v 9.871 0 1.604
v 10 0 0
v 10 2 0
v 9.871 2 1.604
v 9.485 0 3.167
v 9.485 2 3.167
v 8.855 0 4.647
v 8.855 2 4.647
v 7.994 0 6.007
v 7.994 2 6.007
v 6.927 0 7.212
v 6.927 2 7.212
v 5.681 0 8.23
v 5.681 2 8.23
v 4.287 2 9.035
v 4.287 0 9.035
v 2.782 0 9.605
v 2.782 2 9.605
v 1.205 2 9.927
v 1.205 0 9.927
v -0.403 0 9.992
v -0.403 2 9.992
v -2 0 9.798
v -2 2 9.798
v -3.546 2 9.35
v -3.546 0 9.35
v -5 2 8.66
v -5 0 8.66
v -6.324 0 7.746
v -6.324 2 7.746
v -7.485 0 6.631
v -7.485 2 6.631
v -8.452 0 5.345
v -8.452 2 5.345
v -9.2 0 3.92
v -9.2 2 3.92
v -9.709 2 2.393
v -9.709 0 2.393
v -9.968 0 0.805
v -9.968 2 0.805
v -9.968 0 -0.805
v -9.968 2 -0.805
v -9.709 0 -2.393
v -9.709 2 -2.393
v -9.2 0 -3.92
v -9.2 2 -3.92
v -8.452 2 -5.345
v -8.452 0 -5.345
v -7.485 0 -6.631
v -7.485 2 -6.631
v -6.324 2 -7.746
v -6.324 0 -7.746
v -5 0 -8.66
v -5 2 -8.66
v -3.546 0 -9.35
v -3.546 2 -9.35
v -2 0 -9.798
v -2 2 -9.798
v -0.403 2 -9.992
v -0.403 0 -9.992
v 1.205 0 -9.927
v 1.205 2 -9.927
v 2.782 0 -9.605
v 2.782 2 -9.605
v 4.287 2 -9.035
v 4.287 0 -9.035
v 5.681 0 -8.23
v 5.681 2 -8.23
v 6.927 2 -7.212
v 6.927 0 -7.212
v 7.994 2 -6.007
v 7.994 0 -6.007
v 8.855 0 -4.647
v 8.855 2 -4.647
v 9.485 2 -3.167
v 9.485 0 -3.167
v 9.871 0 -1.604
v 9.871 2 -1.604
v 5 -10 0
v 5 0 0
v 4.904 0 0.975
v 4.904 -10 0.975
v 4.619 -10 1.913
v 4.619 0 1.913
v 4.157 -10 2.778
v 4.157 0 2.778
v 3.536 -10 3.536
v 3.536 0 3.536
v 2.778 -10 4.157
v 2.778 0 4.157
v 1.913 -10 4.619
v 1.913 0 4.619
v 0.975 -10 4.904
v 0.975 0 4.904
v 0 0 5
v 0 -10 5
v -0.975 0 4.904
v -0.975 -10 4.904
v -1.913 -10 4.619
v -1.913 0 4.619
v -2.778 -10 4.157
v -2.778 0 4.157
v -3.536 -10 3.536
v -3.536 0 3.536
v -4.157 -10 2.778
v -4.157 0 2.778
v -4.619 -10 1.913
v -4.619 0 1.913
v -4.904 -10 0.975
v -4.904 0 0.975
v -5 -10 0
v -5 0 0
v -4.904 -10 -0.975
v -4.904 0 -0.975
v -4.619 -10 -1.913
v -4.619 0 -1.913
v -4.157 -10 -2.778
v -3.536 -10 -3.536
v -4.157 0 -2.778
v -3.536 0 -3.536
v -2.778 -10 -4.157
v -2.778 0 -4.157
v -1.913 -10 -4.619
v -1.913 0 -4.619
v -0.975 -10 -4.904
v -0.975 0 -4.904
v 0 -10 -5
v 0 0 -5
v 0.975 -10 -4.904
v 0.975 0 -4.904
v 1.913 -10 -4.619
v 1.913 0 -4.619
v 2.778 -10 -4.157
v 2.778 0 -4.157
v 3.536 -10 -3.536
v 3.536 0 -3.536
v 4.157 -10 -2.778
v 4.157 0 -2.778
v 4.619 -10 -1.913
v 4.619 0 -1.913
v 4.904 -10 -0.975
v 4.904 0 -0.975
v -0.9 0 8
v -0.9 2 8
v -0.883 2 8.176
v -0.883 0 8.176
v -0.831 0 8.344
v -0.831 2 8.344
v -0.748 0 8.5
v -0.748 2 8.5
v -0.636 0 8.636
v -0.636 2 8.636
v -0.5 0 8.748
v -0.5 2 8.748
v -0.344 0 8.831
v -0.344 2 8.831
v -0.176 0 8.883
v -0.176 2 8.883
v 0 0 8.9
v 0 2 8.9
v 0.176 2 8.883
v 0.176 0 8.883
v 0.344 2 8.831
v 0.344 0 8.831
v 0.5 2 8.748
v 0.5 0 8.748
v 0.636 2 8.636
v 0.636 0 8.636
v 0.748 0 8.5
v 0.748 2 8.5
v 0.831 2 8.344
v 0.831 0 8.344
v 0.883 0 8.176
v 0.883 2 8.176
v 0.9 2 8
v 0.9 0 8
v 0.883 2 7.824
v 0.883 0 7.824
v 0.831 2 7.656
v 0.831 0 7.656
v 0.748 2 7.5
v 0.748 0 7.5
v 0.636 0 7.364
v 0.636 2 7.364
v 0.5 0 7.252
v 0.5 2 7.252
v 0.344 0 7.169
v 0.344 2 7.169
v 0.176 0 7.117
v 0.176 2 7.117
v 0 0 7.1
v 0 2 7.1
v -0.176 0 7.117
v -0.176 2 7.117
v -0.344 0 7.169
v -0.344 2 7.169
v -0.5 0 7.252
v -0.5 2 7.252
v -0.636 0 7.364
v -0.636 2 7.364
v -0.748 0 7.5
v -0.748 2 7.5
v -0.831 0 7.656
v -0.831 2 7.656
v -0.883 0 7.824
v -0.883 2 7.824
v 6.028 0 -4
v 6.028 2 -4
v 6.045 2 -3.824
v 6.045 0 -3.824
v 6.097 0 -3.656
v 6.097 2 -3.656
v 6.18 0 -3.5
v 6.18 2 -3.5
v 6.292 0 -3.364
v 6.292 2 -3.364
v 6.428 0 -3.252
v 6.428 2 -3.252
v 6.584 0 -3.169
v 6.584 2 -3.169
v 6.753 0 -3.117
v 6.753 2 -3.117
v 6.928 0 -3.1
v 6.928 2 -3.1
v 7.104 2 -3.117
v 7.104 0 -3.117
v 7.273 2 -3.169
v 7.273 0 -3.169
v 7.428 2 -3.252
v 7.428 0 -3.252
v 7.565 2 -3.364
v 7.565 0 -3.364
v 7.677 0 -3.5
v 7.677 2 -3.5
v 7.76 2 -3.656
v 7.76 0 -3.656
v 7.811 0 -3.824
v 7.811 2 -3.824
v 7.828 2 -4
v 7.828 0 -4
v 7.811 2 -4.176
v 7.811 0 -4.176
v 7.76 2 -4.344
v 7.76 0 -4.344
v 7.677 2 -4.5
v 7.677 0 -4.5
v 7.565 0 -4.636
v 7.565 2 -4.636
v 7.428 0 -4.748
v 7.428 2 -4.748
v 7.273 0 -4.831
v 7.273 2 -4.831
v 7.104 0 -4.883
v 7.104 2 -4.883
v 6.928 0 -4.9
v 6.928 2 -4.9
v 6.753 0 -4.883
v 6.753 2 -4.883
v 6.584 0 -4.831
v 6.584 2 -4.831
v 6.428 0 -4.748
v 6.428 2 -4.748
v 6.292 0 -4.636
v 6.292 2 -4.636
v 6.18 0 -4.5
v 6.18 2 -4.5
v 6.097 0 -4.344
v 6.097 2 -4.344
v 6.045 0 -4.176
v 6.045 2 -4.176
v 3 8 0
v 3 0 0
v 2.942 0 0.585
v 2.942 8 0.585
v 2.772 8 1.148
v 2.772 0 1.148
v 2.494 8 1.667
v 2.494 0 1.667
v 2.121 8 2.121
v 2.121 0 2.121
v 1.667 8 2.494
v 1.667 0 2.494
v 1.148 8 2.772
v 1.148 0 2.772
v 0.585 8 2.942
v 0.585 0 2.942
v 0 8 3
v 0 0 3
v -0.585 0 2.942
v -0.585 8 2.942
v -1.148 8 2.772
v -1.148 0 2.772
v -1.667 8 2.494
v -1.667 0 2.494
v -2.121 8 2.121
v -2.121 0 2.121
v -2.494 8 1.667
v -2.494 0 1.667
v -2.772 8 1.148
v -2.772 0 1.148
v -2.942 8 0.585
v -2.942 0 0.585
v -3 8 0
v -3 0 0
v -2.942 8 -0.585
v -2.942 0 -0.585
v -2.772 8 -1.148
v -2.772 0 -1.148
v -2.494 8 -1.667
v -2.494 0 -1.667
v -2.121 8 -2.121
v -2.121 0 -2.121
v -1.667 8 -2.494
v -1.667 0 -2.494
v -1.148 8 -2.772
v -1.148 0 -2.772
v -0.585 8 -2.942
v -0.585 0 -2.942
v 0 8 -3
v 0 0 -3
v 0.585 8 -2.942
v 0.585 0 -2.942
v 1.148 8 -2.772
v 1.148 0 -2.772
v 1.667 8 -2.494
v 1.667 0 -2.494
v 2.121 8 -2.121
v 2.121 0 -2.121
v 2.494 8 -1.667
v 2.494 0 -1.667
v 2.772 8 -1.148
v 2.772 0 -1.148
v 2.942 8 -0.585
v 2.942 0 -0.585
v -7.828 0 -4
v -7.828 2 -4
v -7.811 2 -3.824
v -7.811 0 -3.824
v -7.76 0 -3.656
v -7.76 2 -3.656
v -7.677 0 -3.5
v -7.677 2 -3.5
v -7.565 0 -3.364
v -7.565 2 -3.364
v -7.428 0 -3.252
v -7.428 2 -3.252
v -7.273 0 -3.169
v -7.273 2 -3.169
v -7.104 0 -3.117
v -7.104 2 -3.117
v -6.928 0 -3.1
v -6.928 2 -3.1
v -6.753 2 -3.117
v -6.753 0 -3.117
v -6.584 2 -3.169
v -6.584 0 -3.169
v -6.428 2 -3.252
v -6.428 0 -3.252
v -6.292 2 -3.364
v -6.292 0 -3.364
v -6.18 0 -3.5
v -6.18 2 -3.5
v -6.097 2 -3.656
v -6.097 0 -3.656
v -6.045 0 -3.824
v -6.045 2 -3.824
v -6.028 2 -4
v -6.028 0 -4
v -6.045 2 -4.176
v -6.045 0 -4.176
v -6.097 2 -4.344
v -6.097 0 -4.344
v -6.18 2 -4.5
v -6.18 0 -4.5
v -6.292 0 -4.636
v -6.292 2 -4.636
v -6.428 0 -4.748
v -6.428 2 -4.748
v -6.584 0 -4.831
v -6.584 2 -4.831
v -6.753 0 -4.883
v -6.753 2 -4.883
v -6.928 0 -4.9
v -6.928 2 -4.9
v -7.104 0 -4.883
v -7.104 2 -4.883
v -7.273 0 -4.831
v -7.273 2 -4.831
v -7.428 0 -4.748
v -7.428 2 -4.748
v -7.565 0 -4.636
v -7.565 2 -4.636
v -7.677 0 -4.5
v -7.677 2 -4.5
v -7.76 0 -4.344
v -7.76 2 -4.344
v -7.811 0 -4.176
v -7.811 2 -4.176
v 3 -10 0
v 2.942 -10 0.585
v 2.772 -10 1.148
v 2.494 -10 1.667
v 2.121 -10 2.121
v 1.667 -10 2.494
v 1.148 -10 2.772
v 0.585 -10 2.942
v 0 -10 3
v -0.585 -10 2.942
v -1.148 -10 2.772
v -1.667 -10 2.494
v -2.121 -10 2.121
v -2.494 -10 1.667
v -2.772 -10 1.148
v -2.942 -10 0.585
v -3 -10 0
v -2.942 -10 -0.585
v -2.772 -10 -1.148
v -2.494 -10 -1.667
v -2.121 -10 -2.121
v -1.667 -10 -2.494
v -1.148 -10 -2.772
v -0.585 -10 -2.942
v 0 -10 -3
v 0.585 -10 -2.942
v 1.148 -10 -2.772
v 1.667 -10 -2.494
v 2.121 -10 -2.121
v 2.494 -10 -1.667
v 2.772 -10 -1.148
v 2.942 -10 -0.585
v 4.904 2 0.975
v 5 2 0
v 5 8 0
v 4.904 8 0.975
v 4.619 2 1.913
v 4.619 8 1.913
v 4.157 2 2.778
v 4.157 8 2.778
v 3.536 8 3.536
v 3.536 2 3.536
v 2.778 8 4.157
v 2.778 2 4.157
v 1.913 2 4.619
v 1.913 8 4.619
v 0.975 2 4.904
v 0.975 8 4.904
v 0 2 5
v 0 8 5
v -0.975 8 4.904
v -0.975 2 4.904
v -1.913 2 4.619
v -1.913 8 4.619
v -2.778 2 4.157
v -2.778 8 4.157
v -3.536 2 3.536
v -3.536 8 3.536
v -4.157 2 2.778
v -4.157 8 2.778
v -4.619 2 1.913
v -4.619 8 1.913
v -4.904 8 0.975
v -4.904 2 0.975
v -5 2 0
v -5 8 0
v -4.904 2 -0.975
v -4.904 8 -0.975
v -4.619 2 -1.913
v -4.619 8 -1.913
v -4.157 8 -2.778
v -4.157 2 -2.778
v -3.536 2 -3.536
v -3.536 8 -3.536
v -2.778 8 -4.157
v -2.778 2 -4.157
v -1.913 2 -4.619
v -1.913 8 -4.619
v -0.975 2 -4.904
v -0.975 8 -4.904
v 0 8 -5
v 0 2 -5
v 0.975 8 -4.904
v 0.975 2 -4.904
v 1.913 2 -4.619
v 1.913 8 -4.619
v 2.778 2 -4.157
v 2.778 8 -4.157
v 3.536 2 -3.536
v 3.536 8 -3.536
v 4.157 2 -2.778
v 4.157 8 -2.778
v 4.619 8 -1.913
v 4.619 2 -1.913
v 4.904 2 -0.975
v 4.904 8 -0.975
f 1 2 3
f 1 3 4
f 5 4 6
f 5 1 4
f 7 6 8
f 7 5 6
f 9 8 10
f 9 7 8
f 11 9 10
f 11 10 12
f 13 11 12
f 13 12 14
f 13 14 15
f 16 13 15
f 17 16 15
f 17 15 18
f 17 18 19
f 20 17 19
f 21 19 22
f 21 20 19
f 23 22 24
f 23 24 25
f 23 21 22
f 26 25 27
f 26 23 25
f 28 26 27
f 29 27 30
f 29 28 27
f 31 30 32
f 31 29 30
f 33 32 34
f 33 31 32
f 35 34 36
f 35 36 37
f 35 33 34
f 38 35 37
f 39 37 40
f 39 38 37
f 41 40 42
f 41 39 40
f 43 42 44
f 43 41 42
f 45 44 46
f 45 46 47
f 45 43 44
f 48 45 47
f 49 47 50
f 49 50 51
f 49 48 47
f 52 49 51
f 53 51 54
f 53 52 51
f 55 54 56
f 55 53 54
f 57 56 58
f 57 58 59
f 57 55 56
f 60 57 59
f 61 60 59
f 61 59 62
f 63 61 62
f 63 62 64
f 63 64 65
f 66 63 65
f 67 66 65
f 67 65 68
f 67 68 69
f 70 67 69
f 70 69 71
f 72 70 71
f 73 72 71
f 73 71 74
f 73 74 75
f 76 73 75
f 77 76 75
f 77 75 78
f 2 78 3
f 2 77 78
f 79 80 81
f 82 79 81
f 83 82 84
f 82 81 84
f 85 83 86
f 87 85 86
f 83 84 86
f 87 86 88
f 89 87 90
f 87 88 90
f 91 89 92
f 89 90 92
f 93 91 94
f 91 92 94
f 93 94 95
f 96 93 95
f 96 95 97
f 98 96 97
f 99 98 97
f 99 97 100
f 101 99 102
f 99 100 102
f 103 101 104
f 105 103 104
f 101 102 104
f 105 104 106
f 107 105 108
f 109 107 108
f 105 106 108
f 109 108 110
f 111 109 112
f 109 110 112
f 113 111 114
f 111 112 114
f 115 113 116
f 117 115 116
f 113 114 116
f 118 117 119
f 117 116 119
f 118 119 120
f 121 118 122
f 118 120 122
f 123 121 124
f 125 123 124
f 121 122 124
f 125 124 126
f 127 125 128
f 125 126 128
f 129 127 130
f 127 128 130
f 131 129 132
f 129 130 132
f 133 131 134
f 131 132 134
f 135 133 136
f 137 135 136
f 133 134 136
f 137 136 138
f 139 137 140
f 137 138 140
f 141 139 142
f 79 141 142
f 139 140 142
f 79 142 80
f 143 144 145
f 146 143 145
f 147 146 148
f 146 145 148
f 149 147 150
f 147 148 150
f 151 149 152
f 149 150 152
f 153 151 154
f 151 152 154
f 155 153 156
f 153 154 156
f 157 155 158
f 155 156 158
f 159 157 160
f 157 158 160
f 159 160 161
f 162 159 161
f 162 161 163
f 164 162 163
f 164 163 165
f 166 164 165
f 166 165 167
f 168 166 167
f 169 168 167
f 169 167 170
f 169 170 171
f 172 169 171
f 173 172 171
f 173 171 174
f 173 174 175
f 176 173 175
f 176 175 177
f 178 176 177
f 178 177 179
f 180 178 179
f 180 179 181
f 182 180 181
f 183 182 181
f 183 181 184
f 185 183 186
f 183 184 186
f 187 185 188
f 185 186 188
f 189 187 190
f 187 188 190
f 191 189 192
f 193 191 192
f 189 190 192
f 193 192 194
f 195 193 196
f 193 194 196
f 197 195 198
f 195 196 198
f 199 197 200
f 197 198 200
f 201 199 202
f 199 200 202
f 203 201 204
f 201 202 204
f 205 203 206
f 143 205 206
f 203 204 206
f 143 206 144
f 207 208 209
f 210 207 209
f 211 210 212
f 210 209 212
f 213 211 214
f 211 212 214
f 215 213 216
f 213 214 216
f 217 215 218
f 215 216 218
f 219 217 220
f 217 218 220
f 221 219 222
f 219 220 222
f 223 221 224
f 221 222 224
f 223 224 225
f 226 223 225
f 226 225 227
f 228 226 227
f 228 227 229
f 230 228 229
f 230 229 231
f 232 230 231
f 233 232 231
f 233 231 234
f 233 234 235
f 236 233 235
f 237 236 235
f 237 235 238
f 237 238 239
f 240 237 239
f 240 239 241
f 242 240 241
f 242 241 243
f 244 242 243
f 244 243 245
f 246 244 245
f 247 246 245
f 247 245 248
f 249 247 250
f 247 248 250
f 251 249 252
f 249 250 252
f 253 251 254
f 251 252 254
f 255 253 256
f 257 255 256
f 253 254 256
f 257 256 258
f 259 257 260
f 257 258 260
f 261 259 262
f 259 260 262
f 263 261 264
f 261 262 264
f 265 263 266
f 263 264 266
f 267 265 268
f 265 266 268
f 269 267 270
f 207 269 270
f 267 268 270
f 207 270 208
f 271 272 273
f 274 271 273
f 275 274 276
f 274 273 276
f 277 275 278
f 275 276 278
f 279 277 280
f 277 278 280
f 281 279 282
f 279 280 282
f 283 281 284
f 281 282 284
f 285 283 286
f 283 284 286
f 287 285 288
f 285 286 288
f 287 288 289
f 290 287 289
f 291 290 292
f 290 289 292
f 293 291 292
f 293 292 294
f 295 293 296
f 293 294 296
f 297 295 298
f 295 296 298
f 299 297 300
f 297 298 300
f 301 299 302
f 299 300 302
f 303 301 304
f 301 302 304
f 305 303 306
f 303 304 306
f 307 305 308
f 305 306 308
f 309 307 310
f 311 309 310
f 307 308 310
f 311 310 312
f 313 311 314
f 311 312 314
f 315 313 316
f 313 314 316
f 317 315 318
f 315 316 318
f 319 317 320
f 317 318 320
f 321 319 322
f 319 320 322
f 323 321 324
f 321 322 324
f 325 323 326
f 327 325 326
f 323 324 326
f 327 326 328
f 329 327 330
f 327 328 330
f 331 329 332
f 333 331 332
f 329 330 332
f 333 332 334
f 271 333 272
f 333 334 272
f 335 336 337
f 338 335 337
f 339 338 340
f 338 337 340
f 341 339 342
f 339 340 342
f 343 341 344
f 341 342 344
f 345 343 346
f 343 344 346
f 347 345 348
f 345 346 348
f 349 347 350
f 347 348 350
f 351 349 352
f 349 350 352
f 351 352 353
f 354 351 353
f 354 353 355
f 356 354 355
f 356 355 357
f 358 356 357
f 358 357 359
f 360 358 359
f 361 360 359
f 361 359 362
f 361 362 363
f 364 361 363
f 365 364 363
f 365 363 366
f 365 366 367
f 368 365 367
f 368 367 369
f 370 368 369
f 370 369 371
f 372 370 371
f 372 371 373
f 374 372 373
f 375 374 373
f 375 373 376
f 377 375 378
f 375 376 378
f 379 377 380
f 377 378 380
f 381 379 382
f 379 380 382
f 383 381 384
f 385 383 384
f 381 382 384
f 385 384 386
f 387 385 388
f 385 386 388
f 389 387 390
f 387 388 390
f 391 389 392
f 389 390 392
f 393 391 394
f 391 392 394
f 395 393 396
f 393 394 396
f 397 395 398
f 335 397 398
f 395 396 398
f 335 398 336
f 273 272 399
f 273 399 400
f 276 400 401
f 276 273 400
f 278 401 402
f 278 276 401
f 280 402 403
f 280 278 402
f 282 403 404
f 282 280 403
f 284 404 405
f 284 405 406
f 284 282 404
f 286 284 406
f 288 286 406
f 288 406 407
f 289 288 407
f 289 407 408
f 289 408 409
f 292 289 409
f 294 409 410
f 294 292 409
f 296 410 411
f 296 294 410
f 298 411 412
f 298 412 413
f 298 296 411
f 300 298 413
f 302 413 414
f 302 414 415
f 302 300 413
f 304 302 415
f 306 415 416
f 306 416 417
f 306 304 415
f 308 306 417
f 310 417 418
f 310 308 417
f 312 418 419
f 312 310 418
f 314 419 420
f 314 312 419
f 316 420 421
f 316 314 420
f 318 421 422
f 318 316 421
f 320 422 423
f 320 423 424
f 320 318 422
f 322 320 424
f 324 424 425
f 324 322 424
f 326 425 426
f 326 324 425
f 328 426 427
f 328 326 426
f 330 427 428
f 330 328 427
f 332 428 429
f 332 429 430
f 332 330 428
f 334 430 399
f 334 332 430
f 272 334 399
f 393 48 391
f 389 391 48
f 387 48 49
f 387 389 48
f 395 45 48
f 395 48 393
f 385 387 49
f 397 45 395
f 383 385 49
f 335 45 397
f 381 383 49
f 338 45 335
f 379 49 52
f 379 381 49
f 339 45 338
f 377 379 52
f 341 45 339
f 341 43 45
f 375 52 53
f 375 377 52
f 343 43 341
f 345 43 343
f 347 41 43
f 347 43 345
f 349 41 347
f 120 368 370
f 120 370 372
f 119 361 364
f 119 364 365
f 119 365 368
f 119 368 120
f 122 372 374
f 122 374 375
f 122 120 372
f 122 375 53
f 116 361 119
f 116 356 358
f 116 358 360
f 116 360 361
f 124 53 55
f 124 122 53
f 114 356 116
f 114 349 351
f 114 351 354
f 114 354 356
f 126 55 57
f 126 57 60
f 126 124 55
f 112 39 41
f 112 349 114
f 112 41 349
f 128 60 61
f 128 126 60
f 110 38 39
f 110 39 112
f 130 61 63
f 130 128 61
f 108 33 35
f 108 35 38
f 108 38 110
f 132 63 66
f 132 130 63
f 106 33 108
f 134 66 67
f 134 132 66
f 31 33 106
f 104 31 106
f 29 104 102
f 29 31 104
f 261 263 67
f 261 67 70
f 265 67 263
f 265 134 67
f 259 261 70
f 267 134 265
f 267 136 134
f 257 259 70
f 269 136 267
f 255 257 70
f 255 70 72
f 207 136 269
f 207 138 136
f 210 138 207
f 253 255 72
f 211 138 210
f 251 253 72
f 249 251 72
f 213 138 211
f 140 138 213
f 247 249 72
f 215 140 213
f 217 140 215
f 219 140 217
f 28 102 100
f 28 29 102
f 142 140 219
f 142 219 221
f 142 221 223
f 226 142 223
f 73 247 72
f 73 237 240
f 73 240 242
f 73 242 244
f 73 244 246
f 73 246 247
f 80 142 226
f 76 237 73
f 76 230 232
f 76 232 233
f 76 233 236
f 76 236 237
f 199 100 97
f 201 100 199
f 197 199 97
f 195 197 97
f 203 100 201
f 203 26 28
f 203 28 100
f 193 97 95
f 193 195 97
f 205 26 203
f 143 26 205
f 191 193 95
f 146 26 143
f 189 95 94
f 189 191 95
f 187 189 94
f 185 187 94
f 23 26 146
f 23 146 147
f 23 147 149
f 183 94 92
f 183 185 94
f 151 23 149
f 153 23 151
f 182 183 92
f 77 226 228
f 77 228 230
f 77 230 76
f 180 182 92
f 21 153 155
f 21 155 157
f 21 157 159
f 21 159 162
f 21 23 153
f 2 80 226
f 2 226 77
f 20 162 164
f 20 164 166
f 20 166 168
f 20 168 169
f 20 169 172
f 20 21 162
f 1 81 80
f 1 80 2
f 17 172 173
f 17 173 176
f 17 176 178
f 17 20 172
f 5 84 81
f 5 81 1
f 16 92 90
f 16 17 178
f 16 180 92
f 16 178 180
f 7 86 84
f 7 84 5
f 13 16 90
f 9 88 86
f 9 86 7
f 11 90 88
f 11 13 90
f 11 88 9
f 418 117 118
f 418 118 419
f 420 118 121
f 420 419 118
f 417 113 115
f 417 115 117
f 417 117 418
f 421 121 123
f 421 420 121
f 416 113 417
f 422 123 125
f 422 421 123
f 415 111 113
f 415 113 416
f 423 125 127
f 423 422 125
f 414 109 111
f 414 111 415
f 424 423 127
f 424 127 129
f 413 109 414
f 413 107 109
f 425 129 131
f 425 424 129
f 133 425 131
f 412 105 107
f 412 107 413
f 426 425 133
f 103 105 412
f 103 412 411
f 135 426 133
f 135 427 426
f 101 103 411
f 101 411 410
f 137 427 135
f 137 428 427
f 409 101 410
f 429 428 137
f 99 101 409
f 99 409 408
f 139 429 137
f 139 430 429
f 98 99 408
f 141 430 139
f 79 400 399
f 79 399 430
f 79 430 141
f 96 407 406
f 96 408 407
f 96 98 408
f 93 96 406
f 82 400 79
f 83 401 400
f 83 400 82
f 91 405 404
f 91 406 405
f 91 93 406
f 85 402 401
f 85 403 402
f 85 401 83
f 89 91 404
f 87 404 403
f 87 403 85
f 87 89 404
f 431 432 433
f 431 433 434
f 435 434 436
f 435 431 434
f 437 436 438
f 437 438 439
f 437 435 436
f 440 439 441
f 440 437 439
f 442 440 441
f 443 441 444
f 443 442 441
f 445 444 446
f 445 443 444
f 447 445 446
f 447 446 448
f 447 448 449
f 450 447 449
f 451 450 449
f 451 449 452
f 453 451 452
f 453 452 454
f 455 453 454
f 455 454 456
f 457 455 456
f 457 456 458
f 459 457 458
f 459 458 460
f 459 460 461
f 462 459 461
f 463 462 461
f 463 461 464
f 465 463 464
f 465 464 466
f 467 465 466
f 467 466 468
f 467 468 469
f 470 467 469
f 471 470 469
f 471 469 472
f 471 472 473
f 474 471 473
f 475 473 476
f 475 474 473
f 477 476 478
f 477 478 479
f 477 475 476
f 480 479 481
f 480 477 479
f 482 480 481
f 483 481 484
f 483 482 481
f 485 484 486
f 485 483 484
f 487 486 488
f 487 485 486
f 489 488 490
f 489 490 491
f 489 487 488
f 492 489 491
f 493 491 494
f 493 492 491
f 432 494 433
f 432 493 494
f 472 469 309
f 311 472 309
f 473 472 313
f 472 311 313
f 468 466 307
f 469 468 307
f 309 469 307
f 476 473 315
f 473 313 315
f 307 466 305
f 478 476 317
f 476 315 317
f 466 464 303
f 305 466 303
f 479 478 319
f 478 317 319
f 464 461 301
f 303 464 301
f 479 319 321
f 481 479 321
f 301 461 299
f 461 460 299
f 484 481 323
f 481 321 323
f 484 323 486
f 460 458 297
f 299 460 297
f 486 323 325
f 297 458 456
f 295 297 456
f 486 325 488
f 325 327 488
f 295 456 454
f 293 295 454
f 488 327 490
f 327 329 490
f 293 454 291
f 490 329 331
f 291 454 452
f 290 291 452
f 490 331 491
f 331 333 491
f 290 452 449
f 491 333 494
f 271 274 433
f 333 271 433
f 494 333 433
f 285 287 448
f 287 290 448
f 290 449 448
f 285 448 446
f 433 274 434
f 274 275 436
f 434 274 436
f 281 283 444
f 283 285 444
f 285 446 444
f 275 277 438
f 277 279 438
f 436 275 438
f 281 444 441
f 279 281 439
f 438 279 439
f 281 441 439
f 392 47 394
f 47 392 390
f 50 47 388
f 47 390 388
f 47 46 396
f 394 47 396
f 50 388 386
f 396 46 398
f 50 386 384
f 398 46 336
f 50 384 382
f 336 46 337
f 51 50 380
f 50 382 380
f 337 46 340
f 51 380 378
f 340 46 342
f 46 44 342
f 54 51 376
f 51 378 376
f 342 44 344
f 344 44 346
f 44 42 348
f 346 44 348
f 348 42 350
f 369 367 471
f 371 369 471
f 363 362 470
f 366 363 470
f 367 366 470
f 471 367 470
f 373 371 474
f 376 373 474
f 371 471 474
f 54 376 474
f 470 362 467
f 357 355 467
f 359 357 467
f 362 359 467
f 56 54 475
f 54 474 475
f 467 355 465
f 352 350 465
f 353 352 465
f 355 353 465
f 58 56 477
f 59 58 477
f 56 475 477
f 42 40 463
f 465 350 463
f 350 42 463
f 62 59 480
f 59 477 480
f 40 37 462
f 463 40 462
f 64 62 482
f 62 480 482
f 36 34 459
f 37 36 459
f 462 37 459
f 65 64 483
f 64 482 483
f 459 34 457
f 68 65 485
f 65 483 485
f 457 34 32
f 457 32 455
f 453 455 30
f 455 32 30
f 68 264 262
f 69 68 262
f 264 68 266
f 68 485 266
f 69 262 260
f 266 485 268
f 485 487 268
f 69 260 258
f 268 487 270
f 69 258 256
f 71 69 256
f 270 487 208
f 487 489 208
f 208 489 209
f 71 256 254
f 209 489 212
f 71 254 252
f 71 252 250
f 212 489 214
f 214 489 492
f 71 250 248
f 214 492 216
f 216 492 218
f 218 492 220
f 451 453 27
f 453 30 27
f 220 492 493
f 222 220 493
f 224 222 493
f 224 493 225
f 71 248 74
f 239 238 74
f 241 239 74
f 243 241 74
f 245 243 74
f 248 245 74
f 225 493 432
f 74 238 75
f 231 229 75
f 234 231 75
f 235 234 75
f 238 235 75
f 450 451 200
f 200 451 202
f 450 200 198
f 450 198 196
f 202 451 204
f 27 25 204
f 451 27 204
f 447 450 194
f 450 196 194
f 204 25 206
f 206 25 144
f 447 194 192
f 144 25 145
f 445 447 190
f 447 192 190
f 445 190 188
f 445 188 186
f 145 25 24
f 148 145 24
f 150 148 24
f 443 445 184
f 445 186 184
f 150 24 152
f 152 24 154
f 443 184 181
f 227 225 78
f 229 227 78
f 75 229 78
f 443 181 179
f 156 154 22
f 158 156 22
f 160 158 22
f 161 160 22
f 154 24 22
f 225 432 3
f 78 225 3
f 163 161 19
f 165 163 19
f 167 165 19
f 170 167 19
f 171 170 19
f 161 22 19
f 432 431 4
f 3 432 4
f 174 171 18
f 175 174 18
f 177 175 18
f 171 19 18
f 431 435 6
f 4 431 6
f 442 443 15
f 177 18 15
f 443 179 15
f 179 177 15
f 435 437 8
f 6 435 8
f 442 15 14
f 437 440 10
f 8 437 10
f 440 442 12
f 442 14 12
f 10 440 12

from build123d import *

# Parameters (mm, degrees)
F0_R          = 10
F0_R_2        = 5
F1_DEPTH      = 2
F0_R_3        = 3
F2_DEPTH      = 10
F2_DEPTH_BACK = 8
F3_D          = 1.8


with BuildPart() as f1:
    # F0 (on Front) → F1 (new body)
    with BuildSketch(Plane.XZ):
        Circle(F0_R)
        Circle(F0_R_2, mode=Mode.SUBTRACT)
    extrude(amount=-F1_DEPTH)

    # F0 (on Front) → F2 (join, two sides)
    with BuildSketch(Plane.XZ) as f2_sk:
        Circle(F0_R_2)
        Circle(F0_R_3, mode=Mode.SUBTRACT)
    extrude(amount=F2_DEPTH)
    extrude(f2_sk.sketch, amount=-F2_DEPTH_BACK)

    # F3 (through all)
    with Locations(Plane.XZ):
        with Locations((0, 8), (6.928203, -4), (-6.928203, -4)):
            Hole(F3_D / 2)


solid = f1.part
